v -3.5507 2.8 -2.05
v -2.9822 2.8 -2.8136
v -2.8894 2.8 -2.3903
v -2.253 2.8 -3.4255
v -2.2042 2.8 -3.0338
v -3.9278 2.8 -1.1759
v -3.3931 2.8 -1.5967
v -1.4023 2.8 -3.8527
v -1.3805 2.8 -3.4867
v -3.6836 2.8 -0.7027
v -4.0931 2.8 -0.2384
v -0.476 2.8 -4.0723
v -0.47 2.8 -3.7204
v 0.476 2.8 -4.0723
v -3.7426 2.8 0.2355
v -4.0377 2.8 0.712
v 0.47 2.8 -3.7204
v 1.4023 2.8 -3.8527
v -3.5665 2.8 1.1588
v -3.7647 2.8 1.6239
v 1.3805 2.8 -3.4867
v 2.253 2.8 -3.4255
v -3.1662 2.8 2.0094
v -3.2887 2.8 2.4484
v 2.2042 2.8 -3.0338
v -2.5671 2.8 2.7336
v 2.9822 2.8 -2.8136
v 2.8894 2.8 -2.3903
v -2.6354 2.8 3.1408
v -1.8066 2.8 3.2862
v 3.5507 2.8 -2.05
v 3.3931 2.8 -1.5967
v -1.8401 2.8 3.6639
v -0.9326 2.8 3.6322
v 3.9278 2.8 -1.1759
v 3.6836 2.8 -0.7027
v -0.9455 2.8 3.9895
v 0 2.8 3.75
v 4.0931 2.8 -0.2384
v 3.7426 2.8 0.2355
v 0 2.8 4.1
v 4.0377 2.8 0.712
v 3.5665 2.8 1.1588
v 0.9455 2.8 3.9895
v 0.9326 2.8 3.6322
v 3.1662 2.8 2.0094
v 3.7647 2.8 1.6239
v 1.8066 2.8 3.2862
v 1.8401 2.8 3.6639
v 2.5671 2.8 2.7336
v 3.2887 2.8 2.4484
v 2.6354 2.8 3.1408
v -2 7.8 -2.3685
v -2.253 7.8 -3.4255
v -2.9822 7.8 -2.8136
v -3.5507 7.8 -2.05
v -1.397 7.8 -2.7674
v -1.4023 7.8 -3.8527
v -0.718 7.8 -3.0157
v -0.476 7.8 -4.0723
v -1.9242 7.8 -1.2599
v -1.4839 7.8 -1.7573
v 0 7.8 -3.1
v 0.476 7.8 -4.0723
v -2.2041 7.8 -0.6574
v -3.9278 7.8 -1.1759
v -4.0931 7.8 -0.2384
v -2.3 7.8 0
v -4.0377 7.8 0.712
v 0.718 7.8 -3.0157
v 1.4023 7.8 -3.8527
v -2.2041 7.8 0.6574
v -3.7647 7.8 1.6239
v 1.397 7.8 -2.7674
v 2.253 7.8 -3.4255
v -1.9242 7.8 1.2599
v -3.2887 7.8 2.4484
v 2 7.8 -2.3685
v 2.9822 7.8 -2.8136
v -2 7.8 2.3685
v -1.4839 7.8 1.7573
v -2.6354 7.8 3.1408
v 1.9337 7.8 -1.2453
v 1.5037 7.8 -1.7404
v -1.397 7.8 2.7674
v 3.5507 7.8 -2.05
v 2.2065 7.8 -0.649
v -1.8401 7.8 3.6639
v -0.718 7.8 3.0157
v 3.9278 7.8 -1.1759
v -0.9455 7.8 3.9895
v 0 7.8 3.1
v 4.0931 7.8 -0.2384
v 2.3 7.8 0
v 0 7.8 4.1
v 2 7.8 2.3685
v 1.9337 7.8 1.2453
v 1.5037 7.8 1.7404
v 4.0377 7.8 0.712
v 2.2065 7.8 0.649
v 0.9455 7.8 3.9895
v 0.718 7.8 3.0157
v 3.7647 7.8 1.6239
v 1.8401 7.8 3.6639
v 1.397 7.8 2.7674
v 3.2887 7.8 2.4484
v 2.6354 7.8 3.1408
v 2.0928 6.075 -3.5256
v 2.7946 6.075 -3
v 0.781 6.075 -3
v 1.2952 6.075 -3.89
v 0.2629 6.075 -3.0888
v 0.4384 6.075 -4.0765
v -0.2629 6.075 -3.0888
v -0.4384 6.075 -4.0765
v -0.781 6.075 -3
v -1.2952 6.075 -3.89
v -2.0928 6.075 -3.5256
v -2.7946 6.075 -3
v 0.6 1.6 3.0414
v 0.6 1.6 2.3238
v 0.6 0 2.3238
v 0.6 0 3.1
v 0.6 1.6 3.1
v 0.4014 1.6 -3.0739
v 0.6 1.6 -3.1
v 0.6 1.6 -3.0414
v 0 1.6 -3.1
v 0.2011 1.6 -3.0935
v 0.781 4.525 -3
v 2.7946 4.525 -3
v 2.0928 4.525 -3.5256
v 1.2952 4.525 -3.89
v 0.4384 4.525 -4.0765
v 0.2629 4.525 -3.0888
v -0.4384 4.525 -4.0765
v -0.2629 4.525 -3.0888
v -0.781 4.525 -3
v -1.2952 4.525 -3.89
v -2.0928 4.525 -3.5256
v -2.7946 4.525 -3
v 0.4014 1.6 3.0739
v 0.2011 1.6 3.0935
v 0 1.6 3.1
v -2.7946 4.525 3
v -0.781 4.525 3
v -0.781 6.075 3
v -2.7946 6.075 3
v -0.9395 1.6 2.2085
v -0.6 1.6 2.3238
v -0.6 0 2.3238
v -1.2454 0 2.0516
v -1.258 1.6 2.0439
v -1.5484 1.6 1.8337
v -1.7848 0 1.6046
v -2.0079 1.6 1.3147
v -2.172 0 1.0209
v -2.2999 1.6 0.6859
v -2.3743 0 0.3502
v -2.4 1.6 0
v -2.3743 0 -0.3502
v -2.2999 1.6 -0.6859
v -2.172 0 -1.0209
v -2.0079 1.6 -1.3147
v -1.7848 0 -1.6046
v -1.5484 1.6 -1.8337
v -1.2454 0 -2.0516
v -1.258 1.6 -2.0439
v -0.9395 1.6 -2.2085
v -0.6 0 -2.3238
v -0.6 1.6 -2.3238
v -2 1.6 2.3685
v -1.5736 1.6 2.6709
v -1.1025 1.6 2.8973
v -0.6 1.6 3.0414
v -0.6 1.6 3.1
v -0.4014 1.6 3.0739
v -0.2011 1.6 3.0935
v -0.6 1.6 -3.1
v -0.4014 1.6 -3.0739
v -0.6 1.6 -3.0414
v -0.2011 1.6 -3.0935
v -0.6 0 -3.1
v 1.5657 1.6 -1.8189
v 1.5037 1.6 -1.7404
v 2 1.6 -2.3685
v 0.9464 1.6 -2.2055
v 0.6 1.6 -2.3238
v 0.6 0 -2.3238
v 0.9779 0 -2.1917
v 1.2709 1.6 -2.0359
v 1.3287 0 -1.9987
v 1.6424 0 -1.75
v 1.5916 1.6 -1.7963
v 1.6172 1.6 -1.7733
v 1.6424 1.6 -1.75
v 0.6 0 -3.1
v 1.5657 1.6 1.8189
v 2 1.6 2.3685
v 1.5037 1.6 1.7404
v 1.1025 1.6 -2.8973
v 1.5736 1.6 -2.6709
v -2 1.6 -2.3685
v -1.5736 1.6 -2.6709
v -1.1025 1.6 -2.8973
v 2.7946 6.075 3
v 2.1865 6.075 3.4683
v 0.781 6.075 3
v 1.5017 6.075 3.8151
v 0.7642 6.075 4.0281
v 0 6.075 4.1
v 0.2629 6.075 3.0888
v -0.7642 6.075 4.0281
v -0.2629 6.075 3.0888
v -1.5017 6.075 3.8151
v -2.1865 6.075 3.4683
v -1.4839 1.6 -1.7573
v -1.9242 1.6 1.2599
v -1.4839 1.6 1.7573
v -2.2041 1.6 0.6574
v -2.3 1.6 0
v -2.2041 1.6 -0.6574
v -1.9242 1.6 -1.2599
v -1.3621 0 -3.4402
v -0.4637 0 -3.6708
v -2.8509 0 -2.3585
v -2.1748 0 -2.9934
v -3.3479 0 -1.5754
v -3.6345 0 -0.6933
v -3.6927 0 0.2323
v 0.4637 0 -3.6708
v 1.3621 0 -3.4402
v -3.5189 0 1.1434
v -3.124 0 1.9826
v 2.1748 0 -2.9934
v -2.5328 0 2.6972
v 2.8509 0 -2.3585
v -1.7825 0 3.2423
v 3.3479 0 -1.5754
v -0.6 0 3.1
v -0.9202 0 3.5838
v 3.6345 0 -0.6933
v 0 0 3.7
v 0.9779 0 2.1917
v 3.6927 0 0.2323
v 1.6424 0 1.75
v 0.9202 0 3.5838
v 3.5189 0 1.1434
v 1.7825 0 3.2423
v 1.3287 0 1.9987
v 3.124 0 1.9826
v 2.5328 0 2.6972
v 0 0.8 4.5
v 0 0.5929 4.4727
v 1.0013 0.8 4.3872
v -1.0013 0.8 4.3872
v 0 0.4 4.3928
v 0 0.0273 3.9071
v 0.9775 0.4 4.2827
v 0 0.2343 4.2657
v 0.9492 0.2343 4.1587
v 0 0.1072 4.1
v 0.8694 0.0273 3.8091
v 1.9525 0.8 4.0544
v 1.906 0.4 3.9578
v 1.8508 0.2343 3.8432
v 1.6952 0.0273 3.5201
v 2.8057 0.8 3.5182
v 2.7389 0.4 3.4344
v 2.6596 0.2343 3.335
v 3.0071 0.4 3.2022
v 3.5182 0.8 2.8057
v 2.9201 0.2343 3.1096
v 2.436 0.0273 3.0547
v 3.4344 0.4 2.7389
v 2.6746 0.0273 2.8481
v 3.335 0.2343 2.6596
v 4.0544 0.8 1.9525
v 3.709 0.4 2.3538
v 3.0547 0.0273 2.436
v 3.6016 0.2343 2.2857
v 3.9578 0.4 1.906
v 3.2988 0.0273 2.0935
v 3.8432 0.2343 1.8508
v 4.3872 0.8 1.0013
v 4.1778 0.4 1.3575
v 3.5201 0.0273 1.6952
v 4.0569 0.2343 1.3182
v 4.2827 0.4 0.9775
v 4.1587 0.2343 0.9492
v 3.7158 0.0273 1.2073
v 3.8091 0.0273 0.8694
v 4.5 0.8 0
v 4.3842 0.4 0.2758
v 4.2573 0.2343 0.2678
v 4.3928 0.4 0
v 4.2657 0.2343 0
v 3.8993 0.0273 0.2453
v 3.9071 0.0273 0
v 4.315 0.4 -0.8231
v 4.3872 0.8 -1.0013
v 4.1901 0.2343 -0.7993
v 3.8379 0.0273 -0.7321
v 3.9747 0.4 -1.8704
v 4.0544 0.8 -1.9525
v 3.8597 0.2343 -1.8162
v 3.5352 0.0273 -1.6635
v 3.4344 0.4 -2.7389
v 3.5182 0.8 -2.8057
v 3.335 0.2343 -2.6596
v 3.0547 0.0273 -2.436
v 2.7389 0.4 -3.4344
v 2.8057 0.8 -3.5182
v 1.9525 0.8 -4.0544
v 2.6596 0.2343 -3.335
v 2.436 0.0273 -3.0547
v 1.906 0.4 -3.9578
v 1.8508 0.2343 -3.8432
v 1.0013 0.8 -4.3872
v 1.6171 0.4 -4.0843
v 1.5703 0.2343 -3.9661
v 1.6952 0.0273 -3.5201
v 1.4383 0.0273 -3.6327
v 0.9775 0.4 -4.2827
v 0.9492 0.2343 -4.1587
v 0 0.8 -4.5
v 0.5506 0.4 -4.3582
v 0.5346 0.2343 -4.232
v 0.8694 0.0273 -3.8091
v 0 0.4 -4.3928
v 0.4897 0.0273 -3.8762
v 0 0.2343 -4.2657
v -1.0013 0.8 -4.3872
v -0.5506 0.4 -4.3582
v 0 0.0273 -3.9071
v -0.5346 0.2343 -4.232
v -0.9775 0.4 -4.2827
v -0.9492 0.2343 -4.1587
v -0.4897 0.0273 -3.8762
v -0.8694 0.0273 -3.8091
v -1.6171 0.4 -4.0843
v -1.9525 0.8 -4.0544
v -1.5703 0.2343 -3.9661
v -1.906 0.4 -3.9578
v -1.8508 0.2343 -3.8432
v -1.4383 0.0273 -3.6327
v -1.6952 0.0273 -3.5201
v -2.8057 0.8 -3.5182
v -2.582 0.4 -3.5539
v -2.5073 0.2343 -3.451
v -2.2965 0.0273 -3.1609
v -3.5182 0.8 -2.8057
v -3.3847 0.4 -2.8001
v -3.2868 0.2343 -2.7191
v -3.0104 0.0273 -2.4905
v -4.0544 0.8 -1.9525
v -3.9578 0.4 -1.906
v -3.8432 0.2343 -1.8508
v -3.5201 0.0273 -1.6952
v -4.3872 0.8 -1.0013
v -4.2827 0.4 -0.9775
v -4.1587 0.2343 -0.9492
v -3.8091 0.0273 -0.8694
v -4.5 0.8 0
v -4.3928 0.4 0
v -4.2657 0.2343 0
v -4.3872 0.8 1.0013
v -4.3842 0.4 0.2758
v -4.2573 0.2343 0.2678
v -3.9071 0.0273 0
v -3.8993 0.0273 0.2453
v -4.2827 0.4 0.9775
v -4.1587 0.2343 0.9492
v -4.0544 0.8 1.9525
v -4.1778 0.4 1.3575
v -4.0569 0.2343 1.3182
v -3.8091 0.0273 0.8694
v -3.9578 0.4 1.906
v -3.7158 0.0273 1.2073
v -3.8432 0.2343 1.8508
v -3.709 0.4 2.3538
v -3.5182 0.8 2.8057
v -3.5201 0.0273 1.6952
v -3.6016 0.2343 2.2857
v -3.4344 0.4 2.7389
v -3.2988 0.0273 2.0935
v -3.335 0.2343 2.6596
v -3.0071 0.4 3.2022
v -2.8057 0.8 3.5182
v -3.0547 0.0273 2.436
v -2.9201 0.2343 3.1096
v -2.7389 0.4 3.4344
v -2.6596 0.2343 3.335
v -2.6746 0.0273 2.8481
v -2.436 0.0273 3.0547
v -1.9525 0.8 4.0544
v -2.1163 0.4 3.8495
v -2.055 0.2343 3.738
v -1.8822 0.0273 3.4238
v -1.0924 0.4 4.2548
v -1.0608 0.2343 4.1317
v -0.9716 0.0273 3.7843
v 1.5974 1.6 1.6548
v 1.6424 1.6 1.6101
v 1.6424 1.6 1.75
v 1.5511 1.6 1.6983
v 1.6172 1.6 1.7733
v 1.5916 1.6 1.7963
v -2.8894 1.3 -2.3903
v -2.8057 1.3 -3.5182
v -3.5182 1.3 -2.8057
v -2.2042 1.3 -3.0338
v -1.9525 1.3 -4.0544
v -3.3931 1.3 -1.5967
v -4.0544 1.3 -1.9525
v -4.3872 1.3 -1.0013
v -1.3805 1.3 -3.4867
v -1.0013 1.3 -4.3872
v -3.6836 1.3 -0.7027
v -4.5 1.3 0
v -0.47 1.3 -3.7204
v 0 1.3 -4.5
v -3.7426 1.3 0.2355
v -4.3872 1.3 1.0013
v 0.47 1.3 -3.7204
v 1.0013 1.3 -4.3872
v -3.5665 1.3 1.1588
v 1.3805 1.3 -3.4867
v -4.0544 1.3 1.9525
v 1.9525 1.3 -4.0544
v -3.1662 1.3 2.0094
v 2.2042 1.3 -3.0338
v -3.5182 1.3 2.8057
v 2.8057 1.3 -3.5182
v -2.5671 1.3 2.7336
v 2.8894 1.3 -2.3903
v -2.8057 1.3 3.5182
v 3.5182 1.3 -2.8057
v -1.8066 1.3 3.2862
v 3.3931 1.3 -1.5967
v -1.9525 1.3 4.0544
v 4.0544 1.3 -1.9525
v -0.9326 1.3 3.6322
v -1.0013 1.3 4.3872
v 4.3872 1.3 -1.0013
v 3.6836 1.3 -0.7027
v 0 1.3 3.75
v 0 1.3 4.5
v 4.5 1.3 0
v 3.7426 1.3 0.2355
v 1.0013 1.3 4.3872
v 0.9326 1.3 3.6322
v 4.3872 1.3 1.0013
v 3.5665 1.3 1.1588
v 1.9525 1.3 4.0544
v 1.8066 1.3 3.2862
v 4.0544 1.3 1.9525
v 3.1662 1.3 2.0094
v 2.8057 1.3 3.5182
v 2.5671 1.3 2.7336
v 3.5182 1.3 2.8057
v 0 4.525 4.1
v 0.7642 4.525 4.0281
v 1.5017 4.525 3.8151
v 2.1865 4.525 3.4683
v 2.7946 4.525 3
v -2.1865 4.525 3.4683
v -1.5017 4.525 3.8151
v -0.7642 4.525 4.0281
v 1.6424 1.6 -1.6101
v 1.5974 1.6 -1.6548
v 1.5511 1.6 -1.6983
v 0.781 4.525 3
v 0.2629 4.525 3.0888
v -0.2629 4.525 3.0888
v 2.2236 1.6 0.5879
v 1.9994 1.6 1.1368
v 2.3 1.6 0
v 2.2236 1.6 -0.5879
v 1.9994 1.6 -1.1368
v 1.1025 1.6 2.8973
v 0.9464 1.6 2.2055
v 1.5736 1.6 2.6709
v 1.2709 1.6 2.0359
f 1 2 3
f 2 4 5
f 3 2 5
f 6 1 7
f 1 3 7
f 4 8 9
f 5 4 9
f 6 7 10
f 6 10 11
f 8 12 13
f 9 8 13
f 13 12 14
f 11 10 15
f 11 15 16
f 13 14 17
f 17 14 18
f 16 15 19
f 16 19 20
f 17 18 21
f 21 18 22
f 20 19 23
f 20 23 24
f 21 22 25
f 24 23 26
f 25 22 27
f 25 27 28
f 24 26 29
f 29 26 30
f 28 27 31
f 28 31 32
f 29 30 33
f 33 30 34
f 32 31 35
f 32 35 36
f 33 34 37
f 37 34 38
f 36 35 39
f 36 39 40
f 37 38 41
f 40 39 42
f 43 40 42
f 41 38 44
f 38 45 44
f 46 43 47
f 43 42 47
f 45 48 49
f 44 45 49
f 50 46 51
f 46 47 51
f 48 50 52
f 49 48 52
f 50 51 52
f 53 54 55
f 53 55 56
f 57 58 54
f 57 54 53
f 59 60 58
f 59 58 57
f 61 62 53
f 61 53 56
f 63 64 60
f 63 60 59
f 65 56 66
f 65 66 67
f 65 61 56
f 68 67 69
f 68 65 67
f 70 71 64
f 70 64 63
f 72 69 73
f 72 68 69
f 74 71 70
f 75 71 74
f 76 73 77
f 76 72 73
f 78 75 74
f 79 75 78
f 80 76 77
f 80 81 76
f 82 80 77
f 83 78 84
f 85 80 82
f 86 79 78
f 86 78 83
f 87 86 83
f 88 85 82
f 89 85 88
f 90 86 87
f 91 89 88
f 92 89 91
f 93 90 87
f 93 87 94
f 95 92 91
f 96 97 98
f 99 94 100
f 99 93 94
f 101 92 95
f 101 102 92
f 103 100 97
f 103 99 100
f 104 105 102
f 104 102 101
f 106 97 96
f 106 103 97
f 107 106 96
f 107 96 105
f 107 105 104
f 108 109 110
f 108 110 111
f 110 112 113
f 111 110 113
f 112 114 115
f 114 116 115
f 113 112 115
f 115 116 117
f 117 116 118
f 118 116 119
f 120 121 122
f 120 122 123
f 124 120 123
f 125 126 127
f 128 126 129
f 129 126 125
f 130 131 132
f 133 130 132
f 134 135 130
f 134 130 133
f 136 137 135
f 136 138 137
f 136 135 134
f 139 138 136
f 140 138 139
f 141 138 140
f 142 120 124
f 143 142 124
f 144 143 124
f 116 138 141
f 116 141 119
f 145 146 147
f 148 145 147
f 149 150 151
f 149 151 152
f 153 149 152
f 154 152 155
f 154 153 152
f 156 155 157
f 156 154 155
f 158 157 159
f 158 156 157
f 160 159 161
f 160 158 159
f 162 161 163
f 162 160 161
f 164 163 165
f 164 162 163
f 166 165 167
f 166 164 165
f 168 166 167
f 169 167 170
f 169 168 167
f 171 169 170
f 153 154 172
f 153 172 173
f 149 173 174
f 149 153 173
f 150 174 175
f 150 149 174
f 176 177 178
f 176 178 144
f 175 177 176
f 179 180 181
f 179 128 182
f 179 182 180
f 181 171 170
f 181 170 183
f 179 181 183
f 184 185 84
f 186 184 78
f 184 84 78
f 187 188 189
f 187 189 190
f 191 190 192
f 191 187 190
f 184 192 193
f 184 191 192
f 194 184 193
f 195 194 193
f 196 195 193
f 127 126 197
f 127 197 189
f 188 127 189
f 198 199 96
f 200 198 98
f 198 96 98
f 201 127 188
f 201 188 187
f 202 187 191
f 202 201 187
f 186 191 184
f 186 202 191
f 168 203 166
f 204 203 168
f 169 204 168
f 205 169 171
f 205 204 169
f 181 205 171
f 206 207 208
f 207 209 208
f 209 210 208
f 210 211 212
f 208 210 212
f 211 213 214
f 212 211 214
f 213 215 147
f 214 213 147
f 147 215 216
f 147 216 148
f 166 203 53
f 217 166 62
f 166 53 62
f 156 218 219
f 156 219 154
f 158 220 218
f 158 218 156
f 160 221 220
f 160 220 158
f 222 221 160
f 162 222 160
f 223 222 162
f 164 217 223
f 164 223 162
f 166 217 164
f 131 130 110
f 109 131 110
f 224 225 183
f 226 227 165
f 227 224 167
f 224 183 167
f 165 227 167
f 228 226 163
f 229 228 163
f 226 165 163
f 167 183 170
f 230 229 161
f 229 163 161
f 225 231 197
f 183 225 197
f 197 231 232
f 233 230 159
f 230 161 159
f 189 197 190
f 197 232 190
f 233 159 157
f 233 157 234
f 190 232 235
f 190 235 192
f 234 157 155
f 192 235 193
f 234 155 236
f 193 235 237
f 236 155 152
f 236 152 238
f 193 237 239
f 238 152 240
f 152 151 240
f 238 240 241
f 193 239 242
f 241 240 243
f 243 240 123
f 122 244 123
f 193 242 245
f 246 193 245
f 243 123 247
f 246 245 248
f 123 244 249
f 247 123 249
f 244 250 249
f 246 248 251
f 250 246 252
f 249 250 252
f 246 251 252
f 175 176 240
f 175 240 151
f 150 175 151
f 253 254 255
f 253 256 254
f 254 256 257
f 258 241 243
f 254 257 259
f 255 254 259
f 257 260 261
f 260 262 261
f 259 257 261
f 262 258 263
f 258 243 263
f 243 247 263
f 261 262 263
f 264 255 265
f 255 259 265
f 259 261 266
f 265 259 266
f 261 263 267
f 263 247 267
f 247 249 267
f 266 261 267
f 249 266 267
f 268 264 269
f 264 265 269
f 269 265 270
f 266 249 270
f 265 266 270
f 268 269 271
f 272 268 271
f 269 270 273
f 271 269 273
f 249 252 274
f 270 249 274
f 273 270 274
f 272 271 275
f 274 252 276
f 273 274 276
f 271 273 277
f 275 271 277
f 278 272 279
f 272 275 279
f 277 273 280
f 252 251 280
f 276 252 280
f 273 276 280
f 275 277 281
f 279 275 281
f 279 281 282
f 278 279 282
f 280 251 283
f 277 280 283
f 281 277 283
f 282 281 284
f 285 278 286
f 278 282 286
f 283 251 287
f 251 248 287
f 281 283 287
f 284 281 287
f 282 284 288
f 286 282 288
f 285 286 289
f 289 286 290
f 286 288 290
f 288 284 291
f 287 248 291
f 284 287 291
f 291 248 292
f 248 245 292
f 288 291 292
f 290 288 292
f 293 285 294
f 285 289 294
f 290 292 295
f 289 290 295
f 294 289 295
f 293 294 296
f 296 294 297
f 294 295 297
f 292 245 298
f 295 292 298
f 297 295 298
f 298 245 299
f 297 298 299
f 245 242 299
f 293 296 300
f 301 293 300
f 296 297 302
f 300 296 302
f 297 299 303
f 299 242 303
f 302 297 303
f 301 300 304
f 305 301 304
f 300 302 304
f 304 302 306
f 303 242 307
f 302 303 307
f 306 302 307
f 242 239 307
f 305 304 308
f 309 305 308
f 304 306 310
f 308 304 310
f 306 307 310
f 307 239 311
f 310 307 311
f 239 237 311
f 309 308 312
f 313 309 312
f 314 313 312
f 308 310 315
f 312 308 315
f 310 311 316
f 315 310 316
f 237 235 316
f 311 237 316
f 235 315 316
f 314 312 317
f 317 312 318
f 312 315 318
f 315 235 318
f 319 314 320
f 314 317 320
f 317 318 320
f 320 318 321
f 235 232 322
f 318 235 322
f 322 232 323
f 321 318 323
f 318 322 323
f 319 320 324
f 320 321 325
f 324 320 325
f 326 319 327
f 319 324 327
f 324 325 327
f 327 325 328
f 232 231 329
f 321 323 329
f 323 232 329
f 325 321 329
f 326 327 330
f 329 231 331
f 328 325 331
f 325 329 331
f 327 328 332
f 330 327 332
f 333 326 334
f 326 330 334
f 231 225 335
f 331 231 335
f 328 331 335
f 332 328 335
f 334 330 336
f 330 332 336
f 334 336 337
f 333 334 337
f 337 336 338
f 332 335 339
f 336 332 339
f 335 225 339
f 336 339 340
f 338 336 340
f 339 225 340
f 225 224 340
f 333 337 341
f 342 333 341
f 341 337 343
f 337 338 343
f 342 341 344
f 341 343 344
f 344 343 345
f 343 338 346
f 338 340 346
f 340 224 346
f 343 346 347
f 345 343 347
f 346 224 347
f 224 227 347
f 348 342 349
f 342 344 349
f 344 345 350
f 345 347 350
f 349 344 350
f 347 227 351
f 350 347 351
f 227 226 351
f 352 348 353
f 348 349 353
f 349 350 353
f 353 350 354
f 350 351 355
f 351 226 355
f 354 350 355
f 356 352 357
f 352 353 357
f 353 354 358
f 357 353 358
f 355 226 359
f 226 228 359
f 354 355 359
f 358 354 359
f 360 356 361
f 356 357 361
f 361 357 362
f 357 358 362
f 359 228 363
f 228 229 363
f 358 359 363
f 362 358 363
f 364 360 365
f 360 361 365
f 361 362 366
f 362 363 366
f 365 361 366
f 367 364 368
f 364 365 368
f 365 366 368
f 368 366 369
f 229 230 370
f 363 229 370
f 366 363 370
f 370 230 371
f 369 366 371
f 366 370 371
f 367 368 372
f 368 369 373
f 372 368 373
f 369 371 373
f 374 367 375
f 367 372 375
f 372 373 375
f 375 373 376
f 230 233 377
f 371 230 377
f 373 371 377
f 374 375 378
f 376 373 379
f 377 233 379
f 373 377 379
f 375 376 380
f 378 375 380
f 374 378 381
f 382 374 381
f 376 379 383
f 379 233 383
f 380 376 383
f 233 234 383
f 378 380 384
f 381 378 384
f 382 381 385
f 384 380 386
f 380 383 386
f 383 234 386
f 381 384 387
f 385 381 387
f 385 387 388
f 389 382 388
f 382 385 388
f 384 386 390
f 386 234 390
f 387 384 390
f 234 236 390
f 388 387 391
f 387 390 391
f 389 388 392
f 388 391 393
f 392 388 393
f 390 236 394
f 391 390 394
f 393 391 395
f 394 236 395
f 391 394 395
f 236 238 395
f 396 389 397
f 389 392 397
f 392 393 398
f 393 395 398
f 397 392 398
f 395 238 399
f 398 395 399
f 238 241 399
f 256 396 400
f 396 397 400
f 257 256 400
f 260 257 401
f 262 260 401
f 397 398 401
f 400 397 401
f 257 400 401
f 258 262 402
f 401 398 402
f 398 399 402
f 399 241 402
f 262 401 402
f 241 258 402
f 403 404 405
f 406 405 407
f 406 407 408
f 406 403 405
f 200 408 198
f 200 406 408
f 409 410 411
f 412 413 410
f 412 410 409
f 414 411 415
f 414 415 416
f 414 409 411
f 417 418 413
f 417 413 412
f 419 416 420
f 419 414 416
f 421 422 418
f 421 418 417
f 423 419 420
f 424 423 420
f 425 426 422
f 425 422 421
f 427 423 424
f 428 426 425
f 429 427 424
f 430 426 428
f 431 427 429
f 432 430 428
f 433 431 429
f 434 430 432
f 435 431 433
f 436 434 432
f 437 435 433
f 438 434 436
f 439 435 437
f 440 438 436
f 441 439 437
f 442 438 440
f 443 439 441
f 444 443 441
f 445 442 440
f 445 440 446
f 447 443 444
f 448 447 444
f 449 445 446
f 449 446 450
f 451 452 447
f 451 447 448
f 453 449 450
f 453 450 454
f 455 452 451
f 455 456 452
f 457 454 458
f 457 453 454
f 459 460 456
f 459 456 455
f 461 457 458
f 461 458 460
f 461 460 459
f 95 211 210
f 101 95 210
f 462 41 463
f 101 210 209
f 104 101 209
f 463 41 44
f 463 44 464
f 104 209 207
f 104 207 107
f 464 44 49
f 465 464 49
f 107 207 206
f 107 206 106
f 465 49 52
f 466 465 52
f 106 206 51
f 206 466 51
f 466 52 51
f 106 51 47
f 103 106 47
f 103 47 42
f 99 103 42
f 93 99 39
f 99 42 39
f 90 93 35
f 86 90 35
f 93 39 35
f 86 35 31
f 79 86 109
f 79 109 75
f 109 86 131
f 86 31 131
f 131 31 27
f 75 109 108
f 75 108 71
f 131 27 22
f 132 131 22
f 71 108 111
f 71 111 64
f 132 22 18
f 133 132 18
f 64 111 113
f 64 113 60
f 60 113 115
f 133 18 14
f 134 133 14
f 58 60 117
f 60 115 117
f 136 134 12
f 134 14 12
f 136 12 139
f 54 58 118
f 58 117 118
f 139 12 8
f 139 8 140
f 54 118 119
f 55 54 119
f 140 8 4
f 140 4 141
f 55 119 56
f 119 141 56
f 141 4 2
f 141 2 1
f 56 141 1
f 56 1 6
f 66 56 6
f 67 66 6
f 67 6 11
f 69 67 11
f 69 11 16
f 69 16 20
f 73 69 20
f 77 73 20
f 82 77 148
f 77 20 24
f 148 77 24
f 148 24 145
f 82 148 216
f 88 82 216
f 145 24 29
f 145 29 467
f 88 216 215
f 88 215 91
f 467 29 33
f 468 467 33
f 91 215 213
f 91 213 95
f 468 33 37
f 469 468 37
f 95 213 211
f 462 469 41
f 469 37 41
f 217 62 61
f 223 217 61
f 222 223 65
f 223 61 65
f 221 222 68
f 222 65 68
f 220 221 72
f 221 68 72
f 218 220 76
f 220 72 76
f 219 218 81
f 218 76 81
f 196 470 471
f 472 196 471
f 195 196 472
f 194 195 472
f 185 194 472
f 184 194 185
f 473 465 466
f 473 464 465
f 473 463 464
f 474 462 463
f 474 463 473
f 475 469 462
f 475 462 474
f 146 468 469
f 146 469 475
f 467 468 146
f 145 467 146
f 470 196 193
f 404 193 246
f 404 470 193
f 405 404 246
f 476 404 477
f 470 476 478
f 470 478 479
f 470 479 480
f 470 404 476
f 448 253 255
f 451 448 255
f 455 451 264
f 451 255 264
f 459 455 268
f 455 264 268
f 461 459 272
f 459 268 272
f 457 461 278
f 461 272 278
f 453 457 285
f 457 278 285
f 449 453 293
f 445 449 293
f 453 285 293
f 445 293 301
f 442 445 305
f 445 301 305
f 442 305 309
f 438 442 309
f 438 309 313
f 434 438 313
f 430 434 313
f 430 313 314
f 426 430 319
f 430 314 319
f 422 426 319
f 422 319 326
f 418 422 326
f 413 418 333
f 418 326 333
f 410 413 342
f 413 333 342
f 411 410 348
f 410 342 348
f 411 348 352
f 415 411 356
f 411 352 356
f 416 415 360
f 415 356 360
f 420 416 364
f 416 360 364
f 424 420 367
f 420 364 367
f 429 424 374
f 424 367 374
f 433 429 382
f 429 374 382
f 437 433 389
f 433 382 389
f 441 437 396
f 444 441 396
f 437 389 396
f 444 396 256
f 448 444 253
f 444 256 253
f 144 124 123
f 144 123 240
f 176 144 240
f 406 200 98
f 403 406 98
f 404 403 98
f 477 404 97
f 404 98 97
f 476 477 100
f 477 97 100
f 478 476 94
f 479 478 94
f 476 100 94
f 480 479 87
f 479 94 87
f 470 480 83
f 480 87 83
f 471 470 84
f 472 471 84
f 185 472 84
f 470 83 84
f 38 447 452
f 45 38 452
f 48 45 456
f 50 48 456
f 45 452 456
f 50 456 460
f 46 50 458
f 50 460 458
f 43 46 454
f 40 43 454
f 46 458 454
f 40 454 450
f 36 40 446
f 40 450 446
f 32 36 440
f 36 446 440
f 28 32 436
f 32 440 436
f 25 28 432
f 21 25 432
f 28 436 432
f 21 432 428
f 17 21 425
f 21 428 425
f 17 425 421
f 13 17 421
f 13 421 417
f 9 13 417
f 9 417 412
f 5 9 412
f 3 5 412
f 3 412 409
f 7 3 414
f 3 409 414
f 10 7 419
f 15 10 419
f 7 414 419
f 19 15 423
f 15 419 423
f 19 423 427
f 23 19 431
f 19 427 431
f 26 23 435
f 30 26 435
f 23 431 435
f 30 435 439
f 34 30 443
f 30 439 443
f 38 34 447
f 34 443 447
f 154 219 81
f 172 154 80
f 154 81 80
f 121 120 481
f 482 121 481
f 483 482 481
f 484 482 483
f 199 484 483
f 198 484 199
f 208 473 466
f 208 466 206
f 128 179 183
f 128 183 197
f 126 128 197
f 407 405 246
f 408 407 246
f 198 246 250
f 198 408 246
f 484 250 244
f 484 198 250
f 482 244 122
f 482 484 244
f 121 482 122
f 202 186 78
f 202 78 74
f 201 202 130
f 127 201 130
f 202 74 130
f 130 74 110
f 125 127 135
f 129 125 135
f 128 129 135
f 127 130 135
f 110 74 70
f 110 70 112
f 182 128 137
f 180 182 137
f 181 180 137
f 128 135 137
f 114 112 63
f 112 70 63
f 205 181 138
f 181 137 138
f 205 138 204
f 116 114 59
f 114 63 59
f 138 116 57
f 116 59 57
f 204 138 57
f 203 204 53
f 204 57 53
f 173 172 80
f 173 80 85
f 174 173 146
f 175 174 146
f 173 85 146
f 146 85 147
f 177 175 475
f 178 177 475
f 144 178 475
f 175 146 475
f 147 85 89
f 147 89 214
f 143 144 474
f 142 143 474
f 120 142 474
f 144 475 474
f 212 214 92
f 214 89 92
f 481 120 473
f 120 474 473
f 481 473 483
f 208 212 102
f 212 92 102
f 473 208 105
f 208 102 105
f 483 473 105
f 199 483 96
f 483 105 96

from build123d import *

# Parameters (mm, degrees)
CROQUIS1_R                 = 4.5
SALIENTE_EXTRUIR1_DEPTH    = 1.3
CROQUIS2_R                 = 3.75
SALIENTE_EXTRUIR2_DEPTH    = 1.5
CROQUIS3_R                 = 4.1
SALIENTE_EXTRUIR3_DEPTH    = 5
CORTAR_EXTRUIR3_DEPTH      = 6.2
CORTAR_EXTRUIR4_DEPTH      = 1.8
REDONDEO1_R                = 0.8
CORTAR_EXTRUIR5_DEPTH      = 11.066777041
CORTAR_EXTRUIR5_DEPTH_BACK = 11.066777041
CROQUIS8_W                 = 1.1
CROQUIS8_H                 = 1.55


with BuildPart() as part:
    # Croquis1 → Saliente-Extruir1 (new body)
    with BuildSketch(Plane(origin=(0, 0, 0), x_dir=(1, 0, 0), z_dir=(0, 1, 0))):
        with Locations(Location((0, 0, 0), (0, 0, 270))):
            Circle(CROQUIS1_R)
    extrude(amount=SALIENTE_EXTRUIR1_DEPTH)

    # Croquis2 → Saliente-Extruir2 (add)
    with BuildSketch(Plane(origin=(0, 1.3, 0), x_dir=(1, 0, 0), z_dir=(0, 1, 0))):
        with Locations(Location((0, 0, 0), (0, 0, 270))):
            Circle(CROQUIS2_R)
    extrude(amount=SALIENTE_EXTRUIR2_DEPTH)

    # Croquis3 → Saliente-Extruir3 (add)
    with BuildSketch(Plane(origin=(0, 2.8, 0), x_dir=(1, 0, 0), z_dir=(0, 1, 0))):
        with Locations(Location((0, 0, 0), (0, 0, 270))):
            Circle(CROQUIS3_R)
    extrude(amount=SALIENTE_EXTRUIR3_DEPTH)

    # Croquis4 → Cortar-Extruir3 (cut)
    with BuildSketch(Plane(origin=(0, 7.8, 0), x_dir=(1, 0, 0), z_dir=(0, 1, 0))):
        with BuildLine():
            Line((-2, 2.368543856), (-1.483870968, 1.757306732))
            ThreePointArc((-1.483870968, 1.757306732), (-2.3, 0), (-1.483870968, -1.757306732))
            Line((-1.483870968, -1.757306732), (-2, -2.368543856))
            ThreePointArc((-2, -2.368543856), (0, -3.1), (2, -2.368543856))
            Line((2, -2.368543856), (1.503663664, -1.740400984))
            ThreePointArc((1.503663664, -1.740400984), (2.3, 0), (1.503663664, 1.740400984))
            Line((1.503663664, 1.740400984), (2, 2.368543856))
            ThreePointArc((2, 2.368543856), (0, 3.1), (-2, 2.368543856))
        make_face()
    extrude(amount=-CORTAR_EXTRUIR3_DEPTH, mode=Mode.SUBTRACT)

    # Croquis7 → Cortar-Extruir4 (cut)
    with BuildSketch(Plane(origin=(0, 1.6, 0), x_dir=(1, 0, 0), z_dir=(0, 1, 0))):
        with BuildLine():
            Line((1.642406771, 1.75), (1.642406771, -1.75))
            ThreePointArc((1.642406771, -1.75), (1.157326995, -2.102520922), (0.6, -2.323790008))
            Line((0.6, -2.323790008), (0.6, -3.1))
            Line((0.6, -3.1), (-0.6, -3.1))
            Line((-0.6, -3.1), (-0.6, -2.323790008))
            ThreePointArc((-0.6, -2.323790008), (-2.4, 0), (-0.6, 2.323790008))
            Line((-0.6, 2.323790008), (-0.6, 3.1))
            Line((-0.6, 3.1), (0.6, 3.1))
            Line((0.6, 3.1), (0.6, 2.323790008))
            ThreePointArc((0.6, 2.323790008), (1.157326995, 2.102520922), (1.642406771, 1.75))
        make_face()
    extrude(amount=-CORTAR_EXTRUIR4_DEPTH, mode=Mode.SUBTRACT)

    # Redondeo1
    redondeo1_edges = [part.edges().sort_by_distance(p)[0] for p in [
        (0, 0, -4.5),
    ]]
    fillet(redondeo1_edges, radius=REDONDEO1_R)

    # Croquis8 → Cortar-Extruir5 (cut, two sides: drawn at the far end of the back side and taken through both)
    with BuildSketch(Plane(origin=(0, 0, 0), x_dir=(0, 0, -1), z_dir=(1, 0, 0)).offset(-CORTAR_EXTRUIR5_DEPTH_BACK)):
        with Locations((-3.55, 5.3)):
            Rectangle(CROQUIS8_W, CROQUIS8_H)
        with Locations((3.55, 5.3)):
            Rectangle(CROQUIS8_W, CROQUIS8_H)
    extrude(amount=CORTAR_EXTRUIR5_DEPTH + CORTAR_EXTRUIR5_DEPTH_BACK, mode=Mode.SUBTRACT)


solid = part.part
